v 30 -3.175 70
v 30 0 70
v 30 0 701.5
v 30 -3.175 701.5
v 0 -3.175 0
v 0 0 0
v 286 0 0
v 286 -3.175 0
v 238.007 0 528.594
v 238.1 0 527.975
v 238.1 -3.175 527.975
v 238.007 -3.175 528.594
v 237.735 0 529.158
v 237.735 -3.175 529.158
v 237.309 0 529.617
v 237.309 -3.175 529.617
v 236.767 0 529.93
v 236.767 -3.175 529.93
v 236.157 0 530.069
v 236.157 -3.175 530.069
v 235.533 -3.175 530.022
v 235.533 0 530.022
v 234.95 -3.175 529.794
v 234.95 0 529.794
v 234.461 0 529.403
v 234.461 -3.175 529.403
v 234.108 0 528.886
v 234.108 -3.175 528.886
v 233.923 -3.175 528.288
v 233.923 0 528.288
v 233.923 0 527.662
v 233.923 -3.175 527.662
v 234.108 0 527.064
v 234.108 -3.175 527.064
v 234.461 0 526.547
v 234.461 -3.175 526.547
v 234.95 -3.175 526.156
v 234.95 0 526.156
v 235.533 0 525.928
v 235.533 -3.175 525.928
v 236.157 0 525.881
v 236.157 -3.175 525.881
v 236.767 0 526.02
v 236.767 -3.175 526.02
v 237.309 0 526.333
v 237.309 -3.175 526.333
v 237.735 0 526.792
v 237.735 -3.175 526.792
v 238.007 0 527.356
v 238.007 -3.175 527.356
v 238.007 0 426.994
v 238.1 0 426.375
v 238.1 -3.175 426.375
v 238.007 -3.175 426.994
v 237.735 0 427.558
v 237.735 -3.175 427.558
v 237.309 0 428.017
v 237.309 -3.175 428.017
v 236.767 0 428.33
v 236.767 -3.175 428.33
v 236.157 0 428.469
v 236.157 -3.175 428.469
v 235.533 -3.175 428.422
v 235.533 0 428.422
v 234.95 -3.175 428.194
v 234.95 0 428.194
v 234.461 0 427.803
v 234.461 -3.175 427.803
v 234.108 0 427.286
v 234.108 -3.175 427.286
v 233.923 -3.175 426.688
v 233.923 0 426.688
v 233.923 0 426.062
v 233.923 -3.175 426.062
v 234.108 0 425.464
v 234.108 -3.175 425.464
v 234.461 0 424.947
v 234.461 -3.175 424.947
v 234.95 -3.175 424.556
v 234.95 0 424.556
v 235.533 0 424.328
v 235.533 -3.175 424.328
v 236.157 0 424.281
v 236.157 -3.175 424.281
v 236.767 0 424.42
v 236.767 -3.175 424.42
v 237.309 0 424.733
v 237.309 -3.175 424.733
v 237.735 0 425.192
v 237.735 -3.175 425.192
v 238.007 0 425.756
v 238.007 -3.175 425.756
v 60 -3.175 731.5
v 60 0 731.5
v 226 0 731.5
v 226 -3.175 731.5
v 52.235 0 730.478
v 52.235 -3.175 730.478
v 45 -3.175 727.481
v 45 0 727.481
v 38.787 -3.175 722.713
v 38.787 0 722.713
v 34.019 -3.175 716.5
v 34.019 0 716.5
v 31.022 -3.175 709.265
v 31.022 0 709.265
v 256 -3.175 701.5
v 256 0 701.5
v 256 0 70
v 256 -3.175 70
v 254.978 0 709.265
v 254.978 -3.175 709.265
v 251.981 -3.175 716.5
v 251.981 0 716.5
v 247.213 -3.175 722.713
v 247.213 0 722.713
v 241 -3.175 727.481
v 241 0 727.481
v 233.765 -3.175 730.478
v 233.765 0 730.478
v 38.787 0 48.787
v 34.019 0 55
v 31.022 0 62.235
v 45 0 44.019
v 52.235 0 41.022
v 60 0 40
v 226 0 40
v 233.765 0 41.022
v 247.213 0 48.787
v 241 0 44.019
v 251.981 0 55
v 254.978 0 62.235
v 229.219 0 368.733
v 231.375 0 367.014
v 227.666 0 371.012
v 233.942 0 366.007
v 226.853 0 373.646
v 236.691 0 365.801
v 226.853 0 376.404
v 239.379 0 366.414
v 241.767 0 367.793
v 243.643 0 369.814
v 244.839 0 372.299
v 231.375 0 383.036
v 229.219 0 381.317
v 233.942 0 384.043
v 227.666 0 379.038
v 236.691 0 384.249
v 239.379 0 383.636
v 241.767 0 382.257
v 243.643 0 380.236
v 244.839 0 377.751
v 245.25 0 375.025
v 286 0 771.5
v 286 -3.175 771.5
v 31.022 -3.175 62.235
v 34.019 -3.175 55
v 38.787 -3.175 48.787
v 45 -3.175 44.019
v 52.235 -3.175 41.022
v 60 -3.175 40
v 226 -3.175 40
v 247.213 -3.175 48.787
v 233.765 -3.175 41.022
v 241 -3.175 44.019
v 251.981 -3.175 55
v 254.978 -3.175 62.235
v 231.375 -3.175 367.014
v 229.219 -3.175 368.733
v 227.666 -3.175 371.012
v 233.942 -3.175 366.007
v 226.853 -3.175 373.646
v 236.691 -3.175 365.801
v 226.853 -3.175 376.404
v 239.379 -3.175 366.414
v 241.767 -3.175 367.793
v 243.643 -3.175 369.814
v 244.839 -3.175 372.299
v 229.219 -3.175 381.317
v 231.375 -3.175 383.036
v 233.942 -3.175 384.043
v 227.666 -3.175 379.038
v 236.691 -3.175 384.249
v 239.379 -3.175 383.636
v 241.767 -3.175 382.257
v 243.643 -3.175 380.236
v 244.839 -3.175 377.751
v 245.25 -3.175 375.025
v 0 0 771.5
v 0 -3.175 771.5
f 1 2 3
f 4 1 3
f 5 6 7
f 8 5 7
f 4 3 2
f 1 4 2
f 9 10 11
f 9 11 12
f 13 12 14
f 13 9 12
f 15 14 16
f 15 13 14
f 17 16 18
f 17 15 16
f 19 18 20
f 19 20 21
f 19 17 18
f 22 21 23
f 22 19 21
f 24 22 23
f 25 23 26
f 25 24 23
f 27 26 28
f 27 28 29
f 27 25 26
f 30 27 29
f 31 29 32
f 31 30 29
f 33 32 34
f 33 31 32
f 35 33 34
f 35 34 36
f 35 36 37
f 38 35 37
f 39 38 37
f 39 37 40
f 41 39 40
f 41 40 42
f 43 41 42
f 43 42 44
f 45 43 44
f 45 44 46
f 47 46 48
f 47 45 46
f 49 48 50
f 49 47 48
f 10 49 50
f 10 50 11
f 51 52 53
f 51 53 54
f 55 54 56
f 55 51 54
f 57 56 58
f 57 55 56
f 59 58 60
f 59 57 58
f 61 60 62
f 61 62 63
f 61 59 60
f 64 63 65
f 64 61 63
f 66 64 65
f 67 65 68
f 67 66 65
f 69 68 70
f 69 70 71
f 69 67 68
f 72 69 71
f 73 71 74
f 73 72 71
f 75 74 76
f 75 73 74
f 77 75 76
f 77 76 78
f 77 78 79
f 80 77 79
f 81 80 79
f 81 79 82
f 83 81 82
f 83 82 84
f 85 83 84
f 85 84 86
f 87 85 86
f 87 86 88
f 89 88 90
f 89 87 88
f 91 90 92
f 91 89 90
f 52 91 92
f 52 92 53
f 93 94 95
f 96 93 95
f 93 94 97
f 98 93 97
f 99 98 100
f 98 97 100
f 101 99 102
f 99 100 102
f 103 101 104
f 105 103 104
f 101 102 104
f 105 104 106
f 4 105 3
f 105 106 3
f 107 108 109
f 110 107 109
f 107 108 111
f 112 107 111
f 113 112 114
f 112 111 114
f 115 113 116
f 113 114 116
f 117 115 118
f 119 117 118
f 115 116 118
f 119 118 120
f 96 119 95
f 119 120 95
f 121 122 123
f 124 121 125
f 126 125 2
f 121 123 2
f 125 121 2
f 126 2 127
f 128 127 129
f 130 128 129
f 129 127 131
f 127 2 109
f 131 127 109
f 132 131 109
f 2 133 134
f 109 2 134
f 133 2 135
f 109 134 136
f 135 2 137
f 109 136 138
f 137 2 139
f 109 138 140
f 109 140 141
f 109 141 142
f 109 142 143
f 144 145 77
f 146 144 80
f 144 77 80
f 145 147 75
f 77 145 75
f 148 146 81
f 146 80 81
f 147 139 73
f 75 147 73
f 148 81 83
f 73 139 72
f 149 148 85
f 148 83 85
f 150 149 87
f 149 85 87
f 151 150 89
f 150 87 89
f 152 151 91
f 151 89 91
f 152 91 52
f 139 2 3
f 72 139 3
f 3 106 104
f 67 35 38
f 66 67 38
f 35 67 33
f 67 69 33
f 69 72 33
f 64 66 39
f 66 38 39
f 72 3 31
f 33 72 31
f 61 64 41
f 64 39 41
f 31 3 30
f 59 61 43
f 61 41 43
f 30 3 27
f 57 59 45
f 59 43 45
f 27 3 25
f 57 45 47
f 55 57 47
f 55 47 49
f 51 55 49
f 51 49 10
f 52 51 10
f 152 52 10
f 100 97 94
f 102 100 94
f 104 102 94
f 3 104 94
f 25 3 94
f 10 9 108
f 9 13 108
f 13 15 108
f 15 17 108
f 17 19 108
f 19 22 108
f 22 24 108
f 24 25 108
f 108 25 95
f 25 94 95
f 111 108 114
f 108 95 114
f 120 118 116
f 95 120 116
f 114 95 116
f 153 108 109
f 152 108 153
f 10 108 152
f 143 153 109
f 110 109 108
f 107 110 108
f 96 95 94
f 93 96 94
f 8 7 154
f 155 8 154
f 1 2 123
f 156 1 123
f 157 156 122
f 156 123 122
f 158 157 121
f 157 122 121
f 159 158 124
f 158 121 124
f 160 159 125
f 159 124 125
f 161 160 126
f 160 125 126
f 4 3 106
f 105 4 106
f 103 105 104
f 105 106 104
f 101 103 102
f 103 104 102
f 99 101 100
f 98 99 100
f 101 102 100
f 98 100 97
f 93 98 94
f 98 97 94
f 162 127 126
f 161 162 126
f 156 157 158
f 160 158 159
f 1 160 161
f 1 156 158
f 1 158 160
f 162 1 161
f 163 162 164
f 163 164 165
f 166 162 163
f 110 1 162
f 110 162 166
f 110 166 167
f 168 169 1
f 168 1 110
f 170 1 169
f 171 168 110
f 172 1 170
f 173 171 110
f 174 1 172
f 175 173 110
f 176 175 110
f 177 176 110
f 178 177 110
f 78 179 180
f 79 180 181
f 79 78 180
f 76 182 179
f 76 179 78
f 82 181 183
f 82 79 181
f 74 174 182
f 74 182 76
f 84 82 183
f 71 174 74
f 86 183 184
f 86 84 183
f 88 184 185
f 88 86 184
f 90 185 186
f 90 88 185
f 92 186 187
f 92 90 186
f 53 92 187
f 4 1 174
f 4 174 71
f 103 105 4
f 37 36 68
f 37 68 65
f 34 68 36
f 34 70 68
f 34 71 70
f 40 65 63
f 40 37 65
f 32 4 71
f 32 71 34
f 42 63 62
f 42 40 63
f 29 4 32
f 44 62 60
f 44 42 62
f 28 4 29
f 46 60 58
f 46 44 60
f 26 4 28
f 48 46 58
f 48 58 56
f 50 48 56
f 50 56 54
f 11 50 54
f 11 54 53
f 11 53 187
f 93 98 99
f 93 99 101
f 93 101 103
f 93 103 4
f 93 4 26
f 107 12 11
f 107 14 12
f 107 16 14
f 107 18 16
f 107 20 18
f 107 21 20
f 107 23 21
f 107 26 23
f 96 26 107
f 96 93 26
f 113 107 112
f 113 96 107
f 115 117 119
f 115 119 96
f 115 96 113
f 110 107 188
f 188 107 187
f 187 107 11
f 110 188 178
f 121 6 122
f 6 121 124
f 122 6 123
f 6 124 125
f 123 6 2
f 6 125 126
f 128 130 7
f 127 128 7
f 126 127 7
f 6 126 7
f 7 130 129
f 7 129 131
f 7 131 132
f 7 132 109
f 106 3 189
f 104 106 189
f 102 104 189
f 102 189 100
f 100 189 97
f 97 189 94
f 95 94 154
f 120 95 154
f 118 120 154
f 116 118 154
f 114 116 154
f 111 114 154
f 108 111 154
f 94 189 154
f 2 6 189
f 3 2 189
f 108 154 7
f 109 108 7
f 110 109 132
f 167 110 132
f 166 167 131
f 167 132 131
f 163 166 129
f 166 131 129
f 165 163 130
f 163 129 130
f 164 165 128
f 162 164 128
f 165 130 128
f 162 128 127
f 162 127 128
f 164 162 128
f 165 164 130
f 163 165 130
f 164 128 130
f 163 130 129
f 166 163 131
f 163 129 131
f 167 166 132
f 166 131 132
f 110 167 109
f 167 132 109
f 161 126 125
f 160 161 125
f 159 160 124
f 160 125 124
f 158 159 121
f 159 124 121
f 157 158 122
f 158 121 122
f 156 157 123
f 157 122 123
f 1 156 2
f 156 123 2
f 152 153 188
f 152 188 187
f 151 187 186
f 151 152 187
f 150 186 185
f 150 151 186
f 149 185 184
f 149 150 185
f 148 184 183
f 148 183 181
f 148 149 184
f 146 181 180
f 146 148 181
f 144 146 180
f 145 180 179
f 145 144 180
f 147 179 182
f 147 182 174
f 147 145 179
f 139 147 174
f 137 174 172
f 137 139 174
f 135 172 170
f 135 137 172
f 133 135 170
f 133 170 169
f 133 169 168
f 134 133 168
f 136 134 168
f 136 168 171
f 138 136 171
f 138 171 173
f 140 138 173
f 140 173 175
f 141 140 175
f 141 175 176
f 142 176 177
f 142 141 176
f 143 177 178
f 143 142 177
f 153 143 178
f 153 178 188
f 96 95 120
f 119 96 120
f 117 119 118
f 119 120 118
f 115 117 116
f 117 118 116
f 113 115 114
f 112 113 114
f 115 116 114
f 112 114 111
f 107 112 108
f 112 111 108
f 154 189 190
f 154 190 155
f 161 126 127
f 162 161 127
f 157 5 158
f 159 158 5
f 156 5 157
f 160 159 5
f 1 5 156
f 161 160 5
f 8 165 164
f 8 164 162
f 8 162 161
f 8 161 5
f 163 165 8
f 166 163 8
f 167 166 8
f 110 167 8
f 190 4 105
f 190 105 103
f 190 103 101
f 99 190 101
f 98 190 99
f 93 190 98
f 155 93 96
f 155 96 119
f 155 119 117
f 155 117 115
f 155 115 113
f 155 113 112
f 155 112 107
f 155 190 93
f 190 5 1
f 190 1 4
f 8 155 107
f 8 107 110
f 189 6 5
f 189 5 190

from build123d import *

# Parameters (mm, degrees)
F0_W     = 286
F0_H     = 771.5
F1_DEPTH = 3.175
F0_R     = 9.25
F0_R_2   = 2.1
F2_DEPTH = 3.175


# Not quite as in the source:
# - a length typed as a fraction of an inch, garbled in the dataset ("3 / 203.2 mm" for 3/8 in), is restored


with BuildPart() as f1:
    # F0 (on Front) → F1 (new body)
    with BuildSketch(Plane.XZ):
        with Locations((143, 385.75)):
            Rectangle(F0_W, F0_H)
        with BuildLine():
            ThreePointArc((30, 701.5), (38.7867965644, 722.7132034356), (60, 731.5))
            Line((60, 731.5), (226, 731.5))
            ThreePointArc((226, 731.5), (247.2132034356, 722.7132034356), (256, 701.5))
            Line((256, 701.5), (256, 70))
            ThreePointArc((256, 70), (247.2132034356, 48.7867965644), (226, 40))
            Line((226, 40), (60, 40))
            ThreePointArc((60, 40), (38.7867965644, 48.7867965644), (30, 70))
            Line((30, 70), (30, 701.5))
        make_face(mode=Mode.SUBTRACT)
    extrude(amount=F1_DEPTH)


with BuildPart() as f2:
    # F0 (on Front) → F2 (new body)
    with BuildSketch(Plane.XZ):
        with BuildLine():
            Line((226, 731.5), (60, 731.5))
            ThreePointArc((60, 731.5), (38.7867965644, 722.7132034356), (30, 701.5))
            Line((30, 701.5), (30, 70))
            ThreePointArc((30, 70), (38.7867965644, 48.7867965644), (60, 40))
            Line((60, 40), (226, 40))
            ThreePointArc((226, 40), (247.2132034356, 48.7867965644), (256, 70))
            Line((256, 70), (256, 701.5))
            ThreePointArc((256, 701.5), (247.2132034356, 722.7132034356), (226, 731.5))
        make_face()
        with Locations((236, 375.025)):
            Circle(F0_R, mode=Mode.SUBTRACT)
        with Locations((236, 426.375)):
            Circle(F0_R_2, mode=Mode.SUBTRACT)
        with Locations((236, 527.975)):
            Circle(F0_R_2, mode=Mode.SUBTRACT)
    extrude(amount=F2_DEPTH)


solid = Compound([f1.part, f2.part])
